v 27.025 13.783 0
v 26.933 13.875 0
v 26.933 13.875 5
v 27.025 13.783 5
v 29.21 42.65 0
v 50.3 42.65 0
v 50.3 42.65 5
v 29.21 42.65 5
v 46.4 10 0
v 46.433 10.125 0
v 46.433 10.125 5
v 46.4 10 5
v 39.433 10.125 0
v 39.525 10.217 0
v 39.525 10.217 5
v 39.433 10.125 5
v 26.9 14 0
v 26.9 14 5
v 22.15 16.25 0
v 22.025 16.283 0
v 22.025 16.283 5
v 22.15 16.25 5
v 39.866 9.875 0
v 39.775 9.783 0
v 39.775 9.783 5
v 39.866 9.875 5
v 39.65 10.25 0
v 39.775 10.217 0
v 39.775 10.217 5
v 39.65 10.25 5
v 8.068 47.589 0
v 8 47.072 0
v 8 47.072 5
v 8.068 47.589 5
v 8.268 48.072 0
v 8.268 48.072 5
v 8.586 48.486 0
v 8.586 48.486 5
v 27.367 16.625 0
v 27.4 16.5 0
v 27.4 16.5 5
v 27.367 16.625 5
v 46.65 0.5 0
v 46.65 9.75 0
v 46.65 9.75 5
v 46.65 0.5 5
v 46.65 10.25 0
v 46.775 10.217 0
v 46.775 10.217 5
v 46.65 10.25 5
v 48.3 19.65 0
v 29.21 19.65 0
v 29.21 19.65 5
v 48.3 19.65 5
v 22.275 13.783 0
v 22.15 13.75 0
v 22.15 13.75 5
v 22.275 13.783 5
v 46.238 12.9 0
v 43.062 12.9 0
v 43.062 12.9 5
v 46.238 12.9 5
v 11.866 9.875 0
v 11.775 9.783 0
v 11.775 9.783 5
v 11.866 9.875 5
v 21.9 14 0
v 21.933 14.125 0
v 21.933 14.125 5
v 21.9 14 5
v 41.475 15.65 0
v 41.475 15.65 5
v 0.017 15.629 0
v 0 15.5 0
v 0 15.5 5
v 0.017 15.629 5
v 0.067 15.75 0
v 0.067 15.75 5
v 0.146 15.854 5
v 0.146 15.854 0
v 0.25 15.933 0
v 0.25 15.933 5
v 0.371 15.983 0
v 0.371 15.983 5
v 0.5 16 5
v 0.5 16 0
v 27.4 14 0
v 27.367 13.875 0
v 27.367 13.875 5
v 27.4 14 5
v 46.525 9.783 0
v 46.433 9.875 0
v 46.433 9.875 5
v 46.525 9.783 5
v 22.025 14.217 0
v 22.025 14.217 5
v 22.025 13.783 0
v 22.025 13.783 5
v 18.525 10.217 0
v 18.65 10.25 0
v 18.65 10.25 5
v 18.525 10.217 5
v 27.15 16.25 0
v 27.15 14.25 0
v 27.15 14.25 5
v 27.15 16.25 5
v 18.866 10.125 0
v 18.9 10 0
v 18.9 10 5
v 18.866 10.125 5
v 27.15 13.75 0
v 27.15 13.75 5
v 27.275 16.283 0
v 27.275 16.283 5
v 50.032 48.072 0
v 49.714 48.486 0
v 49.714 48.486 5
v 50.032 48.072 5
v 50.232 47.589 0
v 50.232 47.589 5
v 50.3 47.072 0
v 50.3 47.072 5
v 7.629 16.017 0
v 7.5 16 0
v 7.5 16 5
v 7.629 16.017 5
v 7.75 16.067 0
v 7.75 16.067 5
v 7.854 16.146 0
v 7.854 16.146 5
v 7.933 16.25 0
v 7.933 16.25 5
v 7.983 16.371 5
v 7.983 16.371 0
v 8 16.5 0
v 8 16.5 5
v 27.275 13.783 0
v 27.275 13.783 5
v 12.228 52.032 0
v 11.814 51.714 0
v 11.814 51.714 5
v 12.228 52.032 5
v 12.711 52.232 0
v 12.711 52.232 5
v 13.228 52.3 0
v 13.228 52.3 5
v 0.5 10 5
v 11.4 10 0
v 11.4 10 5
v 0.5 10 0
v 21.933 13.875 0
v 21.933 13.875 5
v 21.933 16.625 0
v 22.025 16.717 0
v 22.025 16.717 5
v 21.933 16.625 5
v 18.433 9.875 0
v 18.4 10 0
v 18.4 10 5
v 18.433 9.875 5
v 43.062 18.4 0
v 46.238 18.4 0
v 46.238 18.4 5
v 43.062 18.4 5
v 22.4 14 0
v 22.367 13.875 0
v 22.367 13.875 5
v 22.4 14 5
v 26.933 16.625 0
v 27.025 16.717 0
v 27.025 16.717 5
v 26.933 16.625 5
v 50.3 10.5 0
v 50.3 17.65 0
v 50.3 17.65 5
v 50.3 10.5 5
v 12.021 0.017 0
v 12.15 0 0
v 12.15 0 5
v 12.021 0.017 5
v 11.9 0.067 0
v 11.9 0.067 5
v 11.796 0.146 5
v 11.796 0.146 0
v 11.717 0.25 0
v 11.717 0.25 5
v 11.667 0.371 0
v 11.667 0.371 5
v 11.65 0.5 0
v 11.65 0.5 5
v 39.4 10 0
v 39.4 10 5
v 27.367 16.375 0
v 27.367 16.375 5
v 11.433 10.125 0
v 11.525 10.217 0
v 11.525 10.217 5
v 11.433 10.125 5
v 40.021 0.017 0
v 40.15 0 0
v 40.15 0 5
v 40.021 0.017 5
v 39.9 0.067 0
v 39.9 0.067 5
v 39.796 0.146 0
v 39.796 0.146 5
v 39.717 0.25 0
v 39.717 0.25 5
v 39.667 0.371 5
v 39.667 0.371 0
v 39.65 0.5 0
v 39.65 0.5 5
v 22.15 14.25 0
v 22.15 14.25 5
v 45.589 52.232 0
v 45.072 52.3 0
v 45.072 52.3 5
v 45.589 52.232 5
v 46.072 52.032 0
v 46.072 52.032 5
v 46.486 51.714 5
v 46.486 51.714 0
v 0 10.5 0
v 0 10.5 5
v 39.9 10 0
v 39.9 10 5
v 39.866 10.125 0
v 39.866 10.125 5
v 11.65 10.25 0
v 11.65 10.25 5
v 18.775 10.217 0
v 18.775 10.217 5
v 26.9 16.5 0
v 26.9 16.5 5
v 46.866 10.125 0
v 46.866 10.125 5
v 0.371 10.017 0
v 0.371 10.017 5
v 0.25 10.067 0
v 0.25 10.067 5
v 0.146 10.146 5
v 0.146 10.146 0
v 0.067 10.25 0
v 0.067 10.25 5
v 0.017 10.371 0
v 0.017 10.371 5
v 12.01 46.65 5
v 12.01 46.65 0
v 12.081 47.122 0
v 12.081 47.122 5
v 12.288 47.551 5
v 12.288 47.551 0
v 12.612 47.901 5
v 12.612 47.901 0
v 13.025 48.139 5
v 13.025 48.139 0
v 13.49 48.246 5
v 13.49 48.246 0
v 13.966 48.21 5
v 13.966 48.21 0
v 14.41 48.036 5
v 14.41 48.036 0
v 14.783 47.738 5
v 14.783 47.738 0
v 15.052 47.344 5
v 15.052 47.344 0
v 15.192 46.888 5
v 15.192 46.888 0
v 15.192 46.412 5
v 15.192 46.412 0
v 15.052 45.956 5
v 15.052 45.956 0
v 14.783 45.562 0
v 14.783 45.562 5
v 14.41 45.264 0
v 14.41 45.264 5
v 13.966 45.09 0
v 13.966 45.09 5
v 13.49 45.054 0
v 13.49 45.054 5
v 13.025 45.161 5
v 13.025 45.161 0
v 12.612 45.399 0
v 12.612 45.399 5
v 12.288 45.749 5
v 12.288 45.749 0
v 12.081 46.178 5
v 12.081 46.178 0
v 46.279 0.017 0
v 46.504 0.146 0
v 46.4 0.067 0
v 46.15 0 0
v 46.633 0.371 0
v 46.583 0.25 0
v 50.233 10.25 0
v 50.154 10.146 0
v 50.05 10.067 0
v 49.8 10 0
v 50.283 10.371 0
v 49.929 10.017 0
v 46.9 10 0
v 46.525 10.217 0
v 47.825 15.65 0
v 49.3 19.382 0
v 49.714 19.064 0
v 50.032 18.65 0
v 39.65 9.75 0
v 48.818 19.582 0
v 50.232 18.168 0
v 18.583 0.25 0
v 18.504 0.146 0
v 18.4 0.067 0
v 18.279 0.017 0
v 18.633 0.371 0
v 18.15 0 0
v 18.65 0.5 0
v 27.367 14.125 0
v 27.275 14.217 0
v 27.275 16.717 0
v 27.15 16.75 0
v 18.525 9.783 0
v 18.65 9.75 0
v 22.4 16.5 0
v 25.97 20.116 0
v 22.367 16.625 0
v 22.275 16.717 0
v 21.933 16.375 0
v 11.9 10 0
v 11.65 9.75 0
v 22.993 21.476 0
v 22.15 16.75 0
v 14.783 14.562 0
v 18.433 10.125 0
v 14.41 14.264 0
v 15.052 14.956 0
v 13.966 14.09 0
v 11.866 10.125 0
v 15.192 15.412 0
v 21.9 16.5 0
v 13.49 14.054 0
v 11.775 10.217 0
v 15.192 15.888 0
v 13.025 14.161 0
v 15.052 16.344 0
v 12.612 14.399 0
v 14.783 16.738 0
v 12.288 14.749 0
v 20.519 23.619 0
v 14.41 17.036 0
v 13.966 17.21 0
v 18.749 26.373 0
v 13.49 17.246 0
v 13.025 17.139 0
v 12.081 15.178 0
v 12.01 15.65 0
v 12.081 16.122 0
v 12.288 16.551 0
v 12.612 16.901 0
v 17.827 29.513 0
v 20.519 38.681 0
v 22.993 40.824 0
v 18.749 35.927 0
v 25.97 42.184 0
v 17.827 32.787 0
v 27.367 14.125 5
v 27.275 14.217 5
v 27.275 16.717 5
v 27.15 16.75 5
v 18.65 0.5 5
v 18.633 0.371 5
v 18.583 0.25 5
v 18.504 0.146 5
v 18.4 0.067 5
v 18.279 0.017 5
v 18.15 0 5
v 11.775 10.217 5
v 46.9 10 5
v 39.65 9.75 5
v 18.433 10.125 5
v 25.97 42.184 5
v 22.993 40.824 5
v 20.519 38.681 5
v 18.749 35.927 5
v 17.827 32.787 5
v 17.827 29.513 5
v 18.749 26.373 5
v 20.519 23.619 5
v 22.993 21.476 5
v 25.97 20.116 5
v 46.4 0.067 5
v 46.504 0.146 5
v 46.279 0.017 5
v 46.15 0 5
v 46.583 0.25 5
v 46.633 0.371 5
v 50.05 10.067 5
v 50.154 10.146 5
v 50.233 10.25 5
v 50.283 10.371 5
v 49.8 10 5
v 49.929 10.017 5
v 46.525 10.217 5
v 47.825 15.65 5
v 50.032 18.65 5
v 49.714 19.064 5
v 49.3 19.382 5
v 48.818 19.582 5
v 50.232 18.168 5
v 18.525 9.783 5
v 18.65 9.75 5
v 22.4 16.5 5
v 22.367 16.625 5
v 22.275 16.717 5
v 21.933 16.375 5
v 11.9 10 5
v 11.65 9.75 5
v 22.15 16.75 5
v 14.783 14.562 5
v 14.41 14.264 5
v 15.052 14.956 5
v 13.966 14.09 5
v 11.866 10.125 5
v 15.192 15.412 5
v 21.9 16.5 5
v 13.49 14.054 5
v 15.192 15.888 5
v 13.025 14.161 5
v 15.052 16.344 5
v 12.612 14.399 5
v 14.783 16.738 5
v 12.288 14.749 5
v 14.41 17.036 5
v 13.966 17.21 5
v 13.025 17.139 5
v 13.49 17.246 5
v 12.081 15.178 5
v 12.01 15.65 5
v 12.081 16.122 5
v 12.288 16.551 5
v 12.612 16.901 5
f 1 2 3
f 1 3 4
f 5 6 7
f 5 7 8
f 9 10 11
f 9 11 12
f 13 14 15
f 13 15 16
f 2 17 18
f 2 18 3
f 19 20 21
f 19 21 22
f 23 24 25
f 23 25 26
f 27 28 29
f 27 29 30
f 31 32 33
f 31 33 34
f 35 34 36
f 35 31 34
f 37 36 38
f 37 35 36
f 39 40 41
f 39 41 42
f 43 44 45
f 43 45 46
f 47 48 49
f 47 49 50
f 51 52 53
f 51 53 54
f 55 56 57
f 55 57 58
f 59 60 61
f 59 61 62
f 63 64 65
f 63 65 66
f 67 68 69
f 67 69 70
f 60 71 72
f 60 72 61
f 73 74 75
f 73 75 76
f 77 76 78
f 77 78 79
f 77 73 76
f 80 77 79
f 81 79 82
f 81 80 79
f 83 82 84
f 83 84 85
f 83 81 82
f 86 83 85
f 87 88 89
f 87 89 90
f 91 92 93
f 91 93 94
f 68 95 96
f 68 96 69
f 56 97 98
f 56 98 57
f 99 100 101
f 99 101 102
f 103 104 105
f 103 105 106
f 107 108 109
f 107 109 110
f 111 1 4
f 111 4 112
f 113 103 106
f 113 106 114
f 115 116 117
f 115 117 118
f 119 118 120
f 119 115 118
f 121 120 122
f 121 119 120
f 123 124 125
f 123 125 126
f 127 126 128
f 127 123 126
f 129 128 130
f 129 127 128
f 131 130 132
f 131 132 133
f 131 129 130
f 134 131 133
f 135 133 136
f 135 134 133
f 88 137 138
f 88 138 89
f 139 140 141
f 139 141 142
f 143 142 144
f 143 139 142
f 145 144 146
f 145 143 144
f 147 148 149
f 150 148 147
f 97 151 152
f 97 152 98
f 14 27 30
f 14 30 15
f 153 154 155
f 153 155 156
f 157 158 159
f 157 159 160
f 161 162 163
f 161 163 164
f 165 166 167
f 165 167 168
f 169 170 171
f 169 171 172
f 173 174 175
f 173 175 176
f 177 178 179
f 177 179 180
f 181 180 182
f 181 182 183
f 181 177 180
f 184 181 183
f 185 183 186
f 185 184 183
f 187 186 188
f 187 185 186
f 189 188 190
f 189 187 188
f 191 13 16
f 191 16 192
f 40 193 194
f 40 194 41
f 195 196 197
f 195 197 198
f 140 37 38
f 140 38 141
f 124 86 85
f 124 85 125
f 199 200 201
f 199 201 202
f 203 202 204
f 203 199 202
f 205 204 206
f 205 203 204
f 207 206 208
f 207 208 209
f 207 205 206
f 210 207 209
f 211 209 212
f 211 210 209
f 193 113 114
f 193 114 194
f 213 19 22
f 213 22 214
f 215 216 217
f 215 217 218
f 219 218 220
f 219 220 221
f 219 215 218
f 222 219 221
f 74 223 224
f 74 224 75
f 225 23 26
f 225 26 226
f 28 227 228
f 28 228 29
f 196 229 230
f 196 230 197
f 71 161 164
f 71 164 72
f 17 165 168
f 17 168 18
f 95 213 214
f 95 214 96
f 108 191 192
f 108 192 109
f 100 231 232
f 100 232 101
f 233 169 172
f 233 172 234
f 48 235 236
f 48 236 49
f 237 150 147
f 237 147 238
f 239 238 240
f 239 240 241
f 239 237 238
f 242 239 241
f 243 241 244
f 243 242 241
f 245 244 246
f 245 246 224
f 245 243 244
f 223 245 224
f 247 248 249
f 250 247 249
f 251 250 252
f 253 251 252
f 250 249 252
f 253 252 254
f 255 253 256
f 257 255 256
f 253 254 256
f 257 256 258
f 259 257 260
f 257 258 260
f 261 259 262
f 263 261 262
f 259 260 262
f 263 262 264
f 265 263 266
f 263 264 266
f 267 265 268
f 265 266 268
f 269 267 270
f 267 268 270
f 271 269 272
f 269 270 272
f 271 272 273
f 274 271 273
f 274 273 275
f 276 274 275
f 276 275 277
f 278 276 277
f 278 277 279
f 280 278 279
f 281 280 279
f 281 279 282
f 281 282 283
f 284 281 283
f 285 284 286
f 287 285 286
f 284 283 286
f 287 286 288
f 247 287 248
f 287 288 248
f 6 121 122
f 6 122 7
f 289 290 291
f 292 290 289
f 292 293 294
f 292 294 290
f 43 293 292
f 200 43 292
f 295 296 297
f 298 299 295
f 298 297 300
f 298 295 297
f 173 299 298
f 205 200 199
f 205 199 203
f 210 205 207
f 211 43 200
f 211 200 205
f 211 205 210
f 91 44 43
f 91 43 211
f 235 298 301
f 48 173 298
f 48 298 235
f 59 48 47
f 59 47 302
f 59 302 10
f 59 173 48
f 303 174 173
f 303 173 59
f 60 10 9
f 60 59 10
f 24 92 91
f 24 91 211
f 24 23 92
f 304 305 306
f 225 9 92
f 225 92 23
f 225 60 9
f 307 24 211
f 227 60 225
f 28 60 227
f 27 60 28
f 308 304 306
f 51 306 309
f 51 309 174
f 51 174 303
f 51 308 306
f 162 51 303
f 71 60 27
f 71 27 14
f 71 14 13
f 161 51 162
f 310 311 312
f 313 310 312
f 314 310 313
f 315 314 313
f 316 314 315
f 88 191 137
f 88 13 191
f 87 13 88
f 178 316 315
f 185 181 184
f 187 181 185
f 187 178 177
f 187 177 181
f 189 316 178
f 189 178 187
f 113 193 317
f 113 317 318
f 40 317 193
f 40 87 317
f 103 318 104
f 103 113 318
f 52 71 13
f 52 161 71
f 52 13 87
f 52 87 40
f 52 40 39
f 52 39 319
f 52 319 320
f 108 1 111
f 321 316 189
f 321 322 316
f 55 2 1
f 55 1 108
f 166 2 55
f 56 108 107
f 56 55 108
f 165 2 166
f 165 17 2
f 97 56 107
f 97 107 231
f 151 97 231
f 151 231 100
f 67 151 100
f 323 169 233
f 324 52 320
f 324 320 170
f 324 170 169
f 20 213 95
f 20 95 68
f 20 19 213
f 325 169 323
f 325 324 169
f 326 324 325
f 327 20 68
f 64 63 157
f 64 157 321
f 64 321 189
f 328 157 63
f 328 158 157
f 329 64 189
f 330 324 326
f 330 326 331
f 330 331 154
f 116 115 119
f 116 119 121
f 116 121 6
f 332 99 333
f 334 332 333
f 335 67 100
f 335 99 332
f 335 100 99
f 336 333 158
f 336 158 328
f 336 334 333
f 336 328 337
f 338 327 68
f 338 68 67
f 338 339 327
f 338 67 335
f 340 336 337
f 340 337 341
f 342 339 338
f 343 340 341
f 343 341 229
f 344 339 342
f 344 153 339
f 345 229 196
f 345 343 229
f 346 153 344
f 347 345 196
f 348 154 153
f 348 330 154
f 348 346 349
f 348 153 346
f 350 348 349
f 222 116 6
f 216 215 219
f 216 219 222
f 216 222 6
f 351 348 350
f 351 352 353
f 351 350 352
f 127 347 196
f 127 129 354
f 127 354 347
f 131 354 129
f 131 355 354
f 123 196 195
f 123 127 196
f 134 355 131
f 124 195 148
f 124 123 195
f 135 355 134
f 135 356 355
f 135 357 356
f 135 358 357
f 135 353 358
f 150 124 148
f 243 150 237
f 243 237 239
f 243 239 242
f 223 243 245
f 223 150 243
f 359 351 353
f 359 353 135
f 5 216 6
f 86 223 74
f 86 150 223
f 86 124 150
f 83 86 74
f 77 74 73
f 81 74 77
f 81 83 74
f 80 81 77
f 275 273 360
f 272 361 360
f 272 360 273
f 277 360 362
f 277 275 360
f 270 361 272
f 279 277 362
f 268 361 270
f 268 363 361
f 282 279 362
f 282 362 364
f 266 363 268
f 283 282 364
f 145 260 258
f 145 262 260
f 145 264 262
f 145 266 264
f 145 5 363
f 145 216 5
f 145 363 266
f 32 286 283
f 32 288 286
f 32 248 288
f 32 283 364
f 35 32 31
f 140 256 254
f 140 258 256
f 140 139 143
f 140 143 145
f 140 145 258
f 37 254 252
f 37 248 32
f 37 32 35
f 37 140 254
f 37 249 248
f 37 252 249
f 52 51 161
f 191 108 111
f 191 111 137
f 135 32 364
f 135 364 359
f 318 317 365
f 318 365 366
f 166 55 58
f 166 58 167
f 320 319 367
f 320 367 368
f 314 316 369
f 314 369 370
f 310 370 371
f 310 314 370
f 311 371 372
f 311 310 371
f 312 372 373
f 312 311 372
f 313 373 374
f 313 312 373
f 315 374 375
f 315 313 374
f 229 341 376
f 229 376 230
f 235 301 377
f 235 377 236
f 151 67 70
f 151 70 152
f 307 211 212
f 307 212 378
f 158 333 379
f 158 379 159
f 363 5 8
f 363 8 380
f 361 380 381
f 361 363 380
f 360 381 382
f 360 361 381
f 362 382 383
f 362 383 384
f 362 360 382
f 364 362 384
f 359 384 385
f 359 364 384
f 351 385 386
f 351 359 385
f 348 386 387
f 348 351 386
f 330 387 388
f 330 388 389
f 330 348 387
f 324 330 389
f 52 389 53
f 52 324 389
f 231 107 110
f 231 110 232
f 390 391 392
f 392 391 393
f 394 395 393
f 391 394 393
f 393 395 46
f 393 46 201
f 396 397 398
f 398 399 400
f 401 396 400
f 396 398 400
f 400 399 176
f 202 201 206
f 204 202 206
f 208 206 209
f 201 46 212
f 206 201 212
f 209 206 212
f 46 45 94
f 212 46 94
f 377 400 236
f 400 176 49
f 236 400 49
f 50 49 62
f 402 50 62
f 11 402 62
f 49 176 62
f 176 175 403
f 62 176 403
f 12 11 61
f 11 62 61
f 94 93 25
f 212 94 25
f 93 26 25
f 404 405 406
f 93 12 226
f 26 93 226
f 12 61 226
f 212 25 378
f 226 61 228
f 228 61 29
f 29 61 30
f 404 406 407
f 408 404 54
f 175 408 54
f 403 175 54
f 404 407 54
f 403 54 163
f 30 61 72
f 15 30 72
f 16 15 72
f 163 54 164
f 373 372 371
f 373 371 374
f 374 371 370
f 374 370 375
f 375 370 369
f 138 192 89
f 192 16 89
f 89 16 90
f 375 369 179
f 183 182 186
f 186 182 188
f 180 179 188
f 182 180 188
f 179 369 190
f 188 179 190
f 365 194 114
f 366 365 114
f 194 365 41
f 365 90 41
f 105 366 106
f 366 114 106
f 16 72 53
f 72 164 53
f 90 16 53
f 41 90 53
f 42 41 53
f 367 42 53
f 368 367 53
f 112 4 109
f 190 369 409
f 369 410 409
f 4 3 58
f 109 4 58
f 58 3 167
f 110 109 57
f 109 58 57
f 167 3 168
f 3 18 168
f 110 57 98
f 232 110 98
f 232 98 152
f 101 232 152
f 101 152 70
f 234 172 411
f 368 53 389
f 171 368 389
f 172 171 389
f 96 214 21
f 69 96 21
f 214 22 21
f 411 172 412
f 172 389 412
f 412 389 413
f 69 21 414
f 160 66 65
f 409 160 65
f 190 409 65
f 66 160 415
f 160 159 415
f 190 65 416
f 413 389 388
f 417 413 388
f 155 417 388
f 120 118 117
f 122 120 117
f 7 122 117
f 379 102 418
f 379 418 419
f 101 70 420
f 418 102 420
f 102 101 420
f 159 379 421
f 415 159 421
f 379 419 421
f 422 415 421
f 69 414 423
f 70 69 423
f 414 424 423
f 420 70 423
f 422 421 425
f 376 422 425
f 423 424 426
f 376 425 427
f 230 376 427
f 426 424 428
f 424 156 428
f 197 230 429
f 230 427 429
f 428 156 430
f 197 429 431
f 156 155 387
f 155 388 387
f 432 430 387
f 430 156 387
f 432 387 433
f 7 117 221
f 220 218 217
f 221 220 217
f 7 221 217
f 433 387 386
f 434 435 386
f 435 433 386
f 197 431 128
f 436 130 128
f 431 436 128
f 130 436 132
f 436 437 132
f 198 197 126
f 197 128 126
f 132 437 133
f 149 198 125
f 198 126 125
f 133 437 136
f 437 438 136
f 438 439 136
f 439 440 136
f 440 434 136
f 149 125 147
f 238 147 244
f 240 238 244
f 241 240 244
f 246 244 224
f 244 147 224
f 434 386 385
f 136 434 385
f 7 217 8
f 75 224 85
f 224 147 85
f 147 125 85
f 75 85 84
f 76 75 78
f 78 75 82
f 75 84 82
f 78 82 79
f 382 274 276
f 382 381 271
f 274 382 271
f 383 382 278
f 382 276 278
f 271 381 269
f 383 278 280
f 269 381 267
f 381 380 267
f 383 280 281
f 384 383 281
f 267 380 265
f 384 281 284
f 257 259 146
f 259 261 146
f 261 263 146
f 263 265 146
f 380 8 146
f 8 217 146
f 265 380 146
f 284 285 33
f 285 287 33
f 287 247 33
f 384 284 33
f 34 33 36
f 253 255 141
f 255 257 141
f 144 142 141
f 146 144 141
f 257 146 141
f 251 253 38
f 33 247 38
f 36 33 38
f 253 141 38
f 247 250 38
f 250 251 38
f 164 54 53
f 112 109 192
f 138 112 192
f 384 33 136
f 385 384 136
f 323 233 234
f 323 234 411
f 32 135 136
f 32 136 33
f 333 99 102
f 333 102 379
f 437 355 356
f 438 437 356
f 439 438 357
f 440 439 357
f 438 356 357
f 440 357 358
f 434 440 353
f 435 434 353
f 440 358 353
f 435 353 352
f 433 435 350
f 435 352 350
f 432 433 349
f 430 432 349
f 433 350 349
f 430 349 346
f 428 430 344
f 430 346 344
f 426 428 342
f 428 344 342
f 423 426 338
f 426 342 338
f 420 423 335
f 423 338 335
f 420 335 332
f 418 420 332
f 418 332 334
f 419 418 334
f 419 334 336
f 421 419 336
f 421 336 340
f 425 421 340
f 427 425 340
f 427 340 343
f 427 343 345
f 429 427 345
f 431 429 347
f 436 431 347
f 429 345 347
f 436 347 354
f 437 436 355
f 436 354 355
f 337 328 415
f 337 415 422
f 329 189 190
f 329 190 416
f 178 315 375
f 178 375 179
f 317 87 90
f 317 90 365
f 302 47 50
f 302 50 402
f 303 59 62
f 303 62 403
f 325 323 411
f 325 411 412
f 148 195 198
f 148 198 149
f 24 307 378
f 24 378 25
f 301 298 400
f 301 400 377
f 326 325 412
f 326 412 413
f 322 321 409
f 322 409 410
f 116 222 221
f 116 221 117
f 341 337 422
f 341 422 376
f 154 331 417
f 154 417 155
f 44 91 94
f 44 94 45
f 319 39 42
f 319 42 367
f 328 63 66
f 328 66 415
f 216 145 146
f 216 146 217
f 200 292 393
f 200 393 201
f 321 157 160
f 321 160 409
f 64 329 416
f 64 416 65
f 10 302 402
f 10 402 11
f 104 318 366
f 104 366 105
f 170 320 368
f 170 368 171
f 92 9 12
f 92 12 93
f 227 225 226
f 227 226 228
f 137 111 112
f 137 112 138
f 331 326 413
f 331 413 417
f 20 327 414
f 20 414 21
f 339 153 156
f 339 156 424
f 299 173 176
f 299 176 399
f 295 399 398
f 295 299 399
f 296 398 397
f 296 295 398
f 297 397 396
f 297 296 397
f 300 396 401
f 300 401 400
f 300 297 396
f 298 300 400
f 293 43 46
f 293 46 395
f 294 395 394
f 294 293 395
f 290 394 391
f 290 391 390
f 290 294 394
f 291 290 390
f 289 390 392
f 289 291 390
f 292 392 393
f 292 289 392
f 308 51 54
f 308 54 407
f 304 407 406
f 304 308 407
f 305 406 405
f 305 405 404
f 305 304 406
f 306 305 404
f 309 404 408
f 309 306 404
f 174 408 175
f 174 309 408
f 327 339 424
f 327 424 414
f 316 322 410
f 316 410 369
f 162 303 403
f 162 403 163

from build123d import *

# Parameters (mm, degrees)
ESQUISSE1_R        = 1.6
BOSS_EXTRU_1_DEPTH = 5


with BuildPart() as part:
    # Esquisse1 → Boss.-Extru.1 (new body)
    with BuildSketch(Plane(origin=(0, 0, 0), x_dir=(-1, 0, 0), z_dir=(0, 0, -1))):
        with BuildLine():
            Line((-13.228382526, 52.300004127), (-45.071523458, 52.300004127))
            ThreePointArc((-45.071523458, 52.300004127), (-45.836893076, 52.147762644), (-46.485742108, 51.714215582))
            Line((-46.485742108, 51.714215582), (-49.714164045, 48.485793645))
            ThreePointArc((-49.714164045, 48.485793645), (-50.147712239, 47.836942919), (-50.299954119, 47.071571303))
            Line((-50.299954119, 47.071571303), (-50.299954119, 42.65))
            Line((-50.299954119, 42.65), (-29.210001453, 42.65))
            ThreePointArc((-29.210001453, 42.65), (-17.71, 31.15), (-29.210001453, 19.65))
            Line((-29.210001453, 19.65), (-48.299953866, 19.65))
            ThreePointArc((-48.299953866, 19.65), (-49.714167607, 19.064213488), (-50.299954119, 17.649999747))
            Line((-50.299954119, 17.649999747), (-50.299954119, 10.499998844))
            ThreePointArc((-50.299954119, 10.499998844), (-50.153507491, 10.146445408), (-49.799954056, 9.99999878))
            Line((-49.799954056, 9.99999878), (-46.899953689, 9.99999878))
            Line((-46.899953689, 9.99999878), (-46.866453685, 10.124998796))
            Line((-46.866453685, 10.124998796), (-46.774953673, 10.216508808))
            Line((-46.774953673, 10.216508808), (-46.649953658, 10.249998812))
            Line((-46.649953658, 10.249998812), (-46.524953642, 10.216508808))
            Line((-46.524953642, 10.216508808), (-46.43344363, 10.124998796))
            Line((-46.43344363, 10.124998796), (-46.399953626, 9.99999878))
            Line((-46.399953626, 9.99999878), (-46.43344363, 9.874998765))
            Line((-46.43344363, 9.874998765), (-46.524953642, 9.783491753))
            Line((-46.524953642, 9.783491753), (-46.649953658, 9.749998749))
            Line((-46.649953658, 9.749998749), (-46.649953658, 0.49999758))
            ThreePointArc((-46.649953658, 0.49999758), (-46.50350703, 0.146444144), (-46.149953594, -2.484e-06))
            Line((-46.149953594, -2.484e-06), (-40.149952936, -2.484e-06))
            ThreePointArc((-40.149952936, -2.484e-06), (-39.79639943, 0.146444174), (-39.649952773, 0.49999768))
            Line((-39.649952773, 0.49999768), (-39.649952773, 9.749998749))
            Line((-39.649952773, 9.749998749), (-39.774952789, 9.783491753))
            Line((-39.774952789, 9.783491753), (-39.8664628, 9.874998765))
            Line((-39.8664628, 9.874998765), (-39.899952805, 9.99999878))
            Line((-39.899952805, 9.99999878), (-39.8664628, 10.124998796))
            Line((-39.8664628, 10.124998796), (-39.774952789, 10.216508808))
            Line((-39.774952789, 10.216508808), (-39.649952773, 10.249998812))
            Line((-39.649952773, 10.249998812), (-39.524952757, 10.216508808))
            Line((-39.524952757, 10.216508808), (-39.433442746, 10.124998796))
            Line((-39.433442746, 10.124998796), (-39.399952741, 9.99999878))
            Line((-39.399952741, 9.99999878), (-18.89995015, 9.99999878))
            Line((-18.89995015, 9.99999878), (-18.866450146, 10.124998796))
            Line((-18.866450146, 10.124998796), (-18.774950135, 10.216508808))
            Line((-18.774950135, 10.216508808), (-18.649950119, 10.249998812))
            Line((-18.649950119, 10.249998812), (-18.524950103, 10.216508808))
            Line((-18.524950103, 10.216508808), (-18.433440091, 10.124998796))
            Line((-18.433440091, 10.124998796), (-18.399950087, 9.99999878))
            Line((-18.399950087, 9.99999878), (-18.433440091, 9.874998765))
            Line((-18.433440091, 9.874998765), (-18.524950103, 9.783491753))
            Line((-18.524950103, 9.783491753), (-18.649950119, 9.749998749))
            Line((-18.649950119, 9.749998749), (-18.649950119, 0.49999758))
            ThreePointArc((-18.649950119, 0.49999758), (-18.503503491, 0.146444144), (-18.149950056, -2.484e-06))
            Line((-18.149950056, -2.484e-06), (-12.149949397, -2.484e-06))
            ThreePointArc((-12.149949397, -2.484e-06), (-11.796395891, 0.146444174), (-11.649949234, 0.49999768))
            Line((-11.649949234, 0.49999768), (-11.649949234, 9.749998749))
            Line((-11.649949234, 9.749998749), (-11.77494925, 9.783491753))
            Line((-11.77494925, 9.783491753), (-11.866459261, 9.874998765))
            Line((-11.866459261, 9.874998765), (-11.899949266, 9.99999878))
            Line((-11.899949266, 9.99999878), (-11.866459261, 10.124998796))
            Line((-11.866459261, 10.124998796), (-11.77494925, 10.216508808))
            Line((-11.77494925, 10.216508808), (-11.649949234, 10.249998812))
            Line((-11.649949234, 10.249998812), (-11.524949218, 10.216508808))
            Line((-11.524949218, 10.216508808), (-11.433439207, 10.124998796))
            Line((-11.433439207, 10.124998796), (-11.399949202, 9.99999878))
            Line((-11.399949202, 9.99999878), (-0.499947825, 9.99999878))
            ThreePointArc((-0.499947825, 9.99999878), (-0.14639439, 10.146445408), (5.2238e-05, 10.499998844))
            Line((5.2238e-05, 10.499998844), (5.2238e-05, 15.499999475))
            ThreePointArc((5.2238e-05, 15.499999475), (-0.14639439, 15.853552911), (-0.499947825, 15.999999539))
            Line((-0.499947825, 15.999999539), (-7.49994871, 15.999999539))
            ThreePointArc((-7.49994871, 15.999999539), (-7.853502145, 16.146446167), (-7.999948773, 16.499999602))
            Line((-7.999948773, 16.499999602), (-7.999948773, 47.071573466))
            ThreePointArc((-7.999948773, 47.071573466), (-8.152190984, 47.836946285), (-8.585740096, 48.485797894))
            Line((-8.585740096, 48.485797894), (-11.814159255, 51.714214053))
            ThreePointArc((-11.814159255, 51.714214053), (-12.46301048, 52.147762254), (-13.228382526, 52.300004127))
        make_face()
        with Locations((-13.61, 46.65)):
            Circle(ESQUISSE1_R, mode=Mode.SUBTRACT)
        with Locations((-13.61, 15.65)):
            Circle(ESQUISSE1_R, mode=Mode.SUBTRACT)
        Polygon((-22.025002784, 14.216511797), (-21.933492772, 14.125001785), (-21.900002768, 14.000001769), (-21.933492772, 13.875001754), (-22.025002784, 13.783491742), (-22.1500028, 13.750001738), (-22.275002815, 13.783491742), (-22.366502827, 13.875001754), (-22.400002831, 14.000001769), (-26.9000034, 14.000001769), (-26.933493404, 13.875001754), (-27.025003416, 13.783491742), (-27.150003431, 13.750001738), (-27.275003447, 13.783491742), (-27.366513459, 13.875001754), (-27.400003463, 14.000001769), (-27.366513459, 14.125001785), (-27.275003447, 14.216511797), (-27.150003431, 14.250001801), (-27.150003431, 16.250002054), (-27.275003447, 16.283492058), (-27.366513459, 16.37500207), (-27.400003463, 16.500002085), (-27.366513459, 16.625002101), (-27.275003447, 16.716512113), (-27.150003431, 16.750002117), (-27.025003416, 16.716512113), (-26.933493404, 16.625002101), (-26.9000034, 16.500002085), (-22.400002831, 16.500002085), (-22.366502827, 16.625002101), (-22.275002815, 16.716512113), (-22.1500028, 16.750002117), (-22.025002784, 16.716512113), (-21.933492772, 16.625002101), (-21.900002768, 16.500002085), (-21.933492772, 16.37500207), (-22.025002784, 16.283492058), (-22.1500028, 16.250002054), (-22.1500028, 14.250001801), align=None, mode=Mode.SUBTRACT)
        Polygon((-43.062295443, 18.400002326), (-41.474585242, 15.650001978), (-43.062295443, 12.90000163), (-46.237715844, 12.90000163), (-47.825426045, 15.650001978), (-46.237715844, 18.400002326), align=None, mode=Mode.SUBTRACT)
    extrude(amount=-BOSS_EXTRU_1_DEPTH)


solid = part.part
